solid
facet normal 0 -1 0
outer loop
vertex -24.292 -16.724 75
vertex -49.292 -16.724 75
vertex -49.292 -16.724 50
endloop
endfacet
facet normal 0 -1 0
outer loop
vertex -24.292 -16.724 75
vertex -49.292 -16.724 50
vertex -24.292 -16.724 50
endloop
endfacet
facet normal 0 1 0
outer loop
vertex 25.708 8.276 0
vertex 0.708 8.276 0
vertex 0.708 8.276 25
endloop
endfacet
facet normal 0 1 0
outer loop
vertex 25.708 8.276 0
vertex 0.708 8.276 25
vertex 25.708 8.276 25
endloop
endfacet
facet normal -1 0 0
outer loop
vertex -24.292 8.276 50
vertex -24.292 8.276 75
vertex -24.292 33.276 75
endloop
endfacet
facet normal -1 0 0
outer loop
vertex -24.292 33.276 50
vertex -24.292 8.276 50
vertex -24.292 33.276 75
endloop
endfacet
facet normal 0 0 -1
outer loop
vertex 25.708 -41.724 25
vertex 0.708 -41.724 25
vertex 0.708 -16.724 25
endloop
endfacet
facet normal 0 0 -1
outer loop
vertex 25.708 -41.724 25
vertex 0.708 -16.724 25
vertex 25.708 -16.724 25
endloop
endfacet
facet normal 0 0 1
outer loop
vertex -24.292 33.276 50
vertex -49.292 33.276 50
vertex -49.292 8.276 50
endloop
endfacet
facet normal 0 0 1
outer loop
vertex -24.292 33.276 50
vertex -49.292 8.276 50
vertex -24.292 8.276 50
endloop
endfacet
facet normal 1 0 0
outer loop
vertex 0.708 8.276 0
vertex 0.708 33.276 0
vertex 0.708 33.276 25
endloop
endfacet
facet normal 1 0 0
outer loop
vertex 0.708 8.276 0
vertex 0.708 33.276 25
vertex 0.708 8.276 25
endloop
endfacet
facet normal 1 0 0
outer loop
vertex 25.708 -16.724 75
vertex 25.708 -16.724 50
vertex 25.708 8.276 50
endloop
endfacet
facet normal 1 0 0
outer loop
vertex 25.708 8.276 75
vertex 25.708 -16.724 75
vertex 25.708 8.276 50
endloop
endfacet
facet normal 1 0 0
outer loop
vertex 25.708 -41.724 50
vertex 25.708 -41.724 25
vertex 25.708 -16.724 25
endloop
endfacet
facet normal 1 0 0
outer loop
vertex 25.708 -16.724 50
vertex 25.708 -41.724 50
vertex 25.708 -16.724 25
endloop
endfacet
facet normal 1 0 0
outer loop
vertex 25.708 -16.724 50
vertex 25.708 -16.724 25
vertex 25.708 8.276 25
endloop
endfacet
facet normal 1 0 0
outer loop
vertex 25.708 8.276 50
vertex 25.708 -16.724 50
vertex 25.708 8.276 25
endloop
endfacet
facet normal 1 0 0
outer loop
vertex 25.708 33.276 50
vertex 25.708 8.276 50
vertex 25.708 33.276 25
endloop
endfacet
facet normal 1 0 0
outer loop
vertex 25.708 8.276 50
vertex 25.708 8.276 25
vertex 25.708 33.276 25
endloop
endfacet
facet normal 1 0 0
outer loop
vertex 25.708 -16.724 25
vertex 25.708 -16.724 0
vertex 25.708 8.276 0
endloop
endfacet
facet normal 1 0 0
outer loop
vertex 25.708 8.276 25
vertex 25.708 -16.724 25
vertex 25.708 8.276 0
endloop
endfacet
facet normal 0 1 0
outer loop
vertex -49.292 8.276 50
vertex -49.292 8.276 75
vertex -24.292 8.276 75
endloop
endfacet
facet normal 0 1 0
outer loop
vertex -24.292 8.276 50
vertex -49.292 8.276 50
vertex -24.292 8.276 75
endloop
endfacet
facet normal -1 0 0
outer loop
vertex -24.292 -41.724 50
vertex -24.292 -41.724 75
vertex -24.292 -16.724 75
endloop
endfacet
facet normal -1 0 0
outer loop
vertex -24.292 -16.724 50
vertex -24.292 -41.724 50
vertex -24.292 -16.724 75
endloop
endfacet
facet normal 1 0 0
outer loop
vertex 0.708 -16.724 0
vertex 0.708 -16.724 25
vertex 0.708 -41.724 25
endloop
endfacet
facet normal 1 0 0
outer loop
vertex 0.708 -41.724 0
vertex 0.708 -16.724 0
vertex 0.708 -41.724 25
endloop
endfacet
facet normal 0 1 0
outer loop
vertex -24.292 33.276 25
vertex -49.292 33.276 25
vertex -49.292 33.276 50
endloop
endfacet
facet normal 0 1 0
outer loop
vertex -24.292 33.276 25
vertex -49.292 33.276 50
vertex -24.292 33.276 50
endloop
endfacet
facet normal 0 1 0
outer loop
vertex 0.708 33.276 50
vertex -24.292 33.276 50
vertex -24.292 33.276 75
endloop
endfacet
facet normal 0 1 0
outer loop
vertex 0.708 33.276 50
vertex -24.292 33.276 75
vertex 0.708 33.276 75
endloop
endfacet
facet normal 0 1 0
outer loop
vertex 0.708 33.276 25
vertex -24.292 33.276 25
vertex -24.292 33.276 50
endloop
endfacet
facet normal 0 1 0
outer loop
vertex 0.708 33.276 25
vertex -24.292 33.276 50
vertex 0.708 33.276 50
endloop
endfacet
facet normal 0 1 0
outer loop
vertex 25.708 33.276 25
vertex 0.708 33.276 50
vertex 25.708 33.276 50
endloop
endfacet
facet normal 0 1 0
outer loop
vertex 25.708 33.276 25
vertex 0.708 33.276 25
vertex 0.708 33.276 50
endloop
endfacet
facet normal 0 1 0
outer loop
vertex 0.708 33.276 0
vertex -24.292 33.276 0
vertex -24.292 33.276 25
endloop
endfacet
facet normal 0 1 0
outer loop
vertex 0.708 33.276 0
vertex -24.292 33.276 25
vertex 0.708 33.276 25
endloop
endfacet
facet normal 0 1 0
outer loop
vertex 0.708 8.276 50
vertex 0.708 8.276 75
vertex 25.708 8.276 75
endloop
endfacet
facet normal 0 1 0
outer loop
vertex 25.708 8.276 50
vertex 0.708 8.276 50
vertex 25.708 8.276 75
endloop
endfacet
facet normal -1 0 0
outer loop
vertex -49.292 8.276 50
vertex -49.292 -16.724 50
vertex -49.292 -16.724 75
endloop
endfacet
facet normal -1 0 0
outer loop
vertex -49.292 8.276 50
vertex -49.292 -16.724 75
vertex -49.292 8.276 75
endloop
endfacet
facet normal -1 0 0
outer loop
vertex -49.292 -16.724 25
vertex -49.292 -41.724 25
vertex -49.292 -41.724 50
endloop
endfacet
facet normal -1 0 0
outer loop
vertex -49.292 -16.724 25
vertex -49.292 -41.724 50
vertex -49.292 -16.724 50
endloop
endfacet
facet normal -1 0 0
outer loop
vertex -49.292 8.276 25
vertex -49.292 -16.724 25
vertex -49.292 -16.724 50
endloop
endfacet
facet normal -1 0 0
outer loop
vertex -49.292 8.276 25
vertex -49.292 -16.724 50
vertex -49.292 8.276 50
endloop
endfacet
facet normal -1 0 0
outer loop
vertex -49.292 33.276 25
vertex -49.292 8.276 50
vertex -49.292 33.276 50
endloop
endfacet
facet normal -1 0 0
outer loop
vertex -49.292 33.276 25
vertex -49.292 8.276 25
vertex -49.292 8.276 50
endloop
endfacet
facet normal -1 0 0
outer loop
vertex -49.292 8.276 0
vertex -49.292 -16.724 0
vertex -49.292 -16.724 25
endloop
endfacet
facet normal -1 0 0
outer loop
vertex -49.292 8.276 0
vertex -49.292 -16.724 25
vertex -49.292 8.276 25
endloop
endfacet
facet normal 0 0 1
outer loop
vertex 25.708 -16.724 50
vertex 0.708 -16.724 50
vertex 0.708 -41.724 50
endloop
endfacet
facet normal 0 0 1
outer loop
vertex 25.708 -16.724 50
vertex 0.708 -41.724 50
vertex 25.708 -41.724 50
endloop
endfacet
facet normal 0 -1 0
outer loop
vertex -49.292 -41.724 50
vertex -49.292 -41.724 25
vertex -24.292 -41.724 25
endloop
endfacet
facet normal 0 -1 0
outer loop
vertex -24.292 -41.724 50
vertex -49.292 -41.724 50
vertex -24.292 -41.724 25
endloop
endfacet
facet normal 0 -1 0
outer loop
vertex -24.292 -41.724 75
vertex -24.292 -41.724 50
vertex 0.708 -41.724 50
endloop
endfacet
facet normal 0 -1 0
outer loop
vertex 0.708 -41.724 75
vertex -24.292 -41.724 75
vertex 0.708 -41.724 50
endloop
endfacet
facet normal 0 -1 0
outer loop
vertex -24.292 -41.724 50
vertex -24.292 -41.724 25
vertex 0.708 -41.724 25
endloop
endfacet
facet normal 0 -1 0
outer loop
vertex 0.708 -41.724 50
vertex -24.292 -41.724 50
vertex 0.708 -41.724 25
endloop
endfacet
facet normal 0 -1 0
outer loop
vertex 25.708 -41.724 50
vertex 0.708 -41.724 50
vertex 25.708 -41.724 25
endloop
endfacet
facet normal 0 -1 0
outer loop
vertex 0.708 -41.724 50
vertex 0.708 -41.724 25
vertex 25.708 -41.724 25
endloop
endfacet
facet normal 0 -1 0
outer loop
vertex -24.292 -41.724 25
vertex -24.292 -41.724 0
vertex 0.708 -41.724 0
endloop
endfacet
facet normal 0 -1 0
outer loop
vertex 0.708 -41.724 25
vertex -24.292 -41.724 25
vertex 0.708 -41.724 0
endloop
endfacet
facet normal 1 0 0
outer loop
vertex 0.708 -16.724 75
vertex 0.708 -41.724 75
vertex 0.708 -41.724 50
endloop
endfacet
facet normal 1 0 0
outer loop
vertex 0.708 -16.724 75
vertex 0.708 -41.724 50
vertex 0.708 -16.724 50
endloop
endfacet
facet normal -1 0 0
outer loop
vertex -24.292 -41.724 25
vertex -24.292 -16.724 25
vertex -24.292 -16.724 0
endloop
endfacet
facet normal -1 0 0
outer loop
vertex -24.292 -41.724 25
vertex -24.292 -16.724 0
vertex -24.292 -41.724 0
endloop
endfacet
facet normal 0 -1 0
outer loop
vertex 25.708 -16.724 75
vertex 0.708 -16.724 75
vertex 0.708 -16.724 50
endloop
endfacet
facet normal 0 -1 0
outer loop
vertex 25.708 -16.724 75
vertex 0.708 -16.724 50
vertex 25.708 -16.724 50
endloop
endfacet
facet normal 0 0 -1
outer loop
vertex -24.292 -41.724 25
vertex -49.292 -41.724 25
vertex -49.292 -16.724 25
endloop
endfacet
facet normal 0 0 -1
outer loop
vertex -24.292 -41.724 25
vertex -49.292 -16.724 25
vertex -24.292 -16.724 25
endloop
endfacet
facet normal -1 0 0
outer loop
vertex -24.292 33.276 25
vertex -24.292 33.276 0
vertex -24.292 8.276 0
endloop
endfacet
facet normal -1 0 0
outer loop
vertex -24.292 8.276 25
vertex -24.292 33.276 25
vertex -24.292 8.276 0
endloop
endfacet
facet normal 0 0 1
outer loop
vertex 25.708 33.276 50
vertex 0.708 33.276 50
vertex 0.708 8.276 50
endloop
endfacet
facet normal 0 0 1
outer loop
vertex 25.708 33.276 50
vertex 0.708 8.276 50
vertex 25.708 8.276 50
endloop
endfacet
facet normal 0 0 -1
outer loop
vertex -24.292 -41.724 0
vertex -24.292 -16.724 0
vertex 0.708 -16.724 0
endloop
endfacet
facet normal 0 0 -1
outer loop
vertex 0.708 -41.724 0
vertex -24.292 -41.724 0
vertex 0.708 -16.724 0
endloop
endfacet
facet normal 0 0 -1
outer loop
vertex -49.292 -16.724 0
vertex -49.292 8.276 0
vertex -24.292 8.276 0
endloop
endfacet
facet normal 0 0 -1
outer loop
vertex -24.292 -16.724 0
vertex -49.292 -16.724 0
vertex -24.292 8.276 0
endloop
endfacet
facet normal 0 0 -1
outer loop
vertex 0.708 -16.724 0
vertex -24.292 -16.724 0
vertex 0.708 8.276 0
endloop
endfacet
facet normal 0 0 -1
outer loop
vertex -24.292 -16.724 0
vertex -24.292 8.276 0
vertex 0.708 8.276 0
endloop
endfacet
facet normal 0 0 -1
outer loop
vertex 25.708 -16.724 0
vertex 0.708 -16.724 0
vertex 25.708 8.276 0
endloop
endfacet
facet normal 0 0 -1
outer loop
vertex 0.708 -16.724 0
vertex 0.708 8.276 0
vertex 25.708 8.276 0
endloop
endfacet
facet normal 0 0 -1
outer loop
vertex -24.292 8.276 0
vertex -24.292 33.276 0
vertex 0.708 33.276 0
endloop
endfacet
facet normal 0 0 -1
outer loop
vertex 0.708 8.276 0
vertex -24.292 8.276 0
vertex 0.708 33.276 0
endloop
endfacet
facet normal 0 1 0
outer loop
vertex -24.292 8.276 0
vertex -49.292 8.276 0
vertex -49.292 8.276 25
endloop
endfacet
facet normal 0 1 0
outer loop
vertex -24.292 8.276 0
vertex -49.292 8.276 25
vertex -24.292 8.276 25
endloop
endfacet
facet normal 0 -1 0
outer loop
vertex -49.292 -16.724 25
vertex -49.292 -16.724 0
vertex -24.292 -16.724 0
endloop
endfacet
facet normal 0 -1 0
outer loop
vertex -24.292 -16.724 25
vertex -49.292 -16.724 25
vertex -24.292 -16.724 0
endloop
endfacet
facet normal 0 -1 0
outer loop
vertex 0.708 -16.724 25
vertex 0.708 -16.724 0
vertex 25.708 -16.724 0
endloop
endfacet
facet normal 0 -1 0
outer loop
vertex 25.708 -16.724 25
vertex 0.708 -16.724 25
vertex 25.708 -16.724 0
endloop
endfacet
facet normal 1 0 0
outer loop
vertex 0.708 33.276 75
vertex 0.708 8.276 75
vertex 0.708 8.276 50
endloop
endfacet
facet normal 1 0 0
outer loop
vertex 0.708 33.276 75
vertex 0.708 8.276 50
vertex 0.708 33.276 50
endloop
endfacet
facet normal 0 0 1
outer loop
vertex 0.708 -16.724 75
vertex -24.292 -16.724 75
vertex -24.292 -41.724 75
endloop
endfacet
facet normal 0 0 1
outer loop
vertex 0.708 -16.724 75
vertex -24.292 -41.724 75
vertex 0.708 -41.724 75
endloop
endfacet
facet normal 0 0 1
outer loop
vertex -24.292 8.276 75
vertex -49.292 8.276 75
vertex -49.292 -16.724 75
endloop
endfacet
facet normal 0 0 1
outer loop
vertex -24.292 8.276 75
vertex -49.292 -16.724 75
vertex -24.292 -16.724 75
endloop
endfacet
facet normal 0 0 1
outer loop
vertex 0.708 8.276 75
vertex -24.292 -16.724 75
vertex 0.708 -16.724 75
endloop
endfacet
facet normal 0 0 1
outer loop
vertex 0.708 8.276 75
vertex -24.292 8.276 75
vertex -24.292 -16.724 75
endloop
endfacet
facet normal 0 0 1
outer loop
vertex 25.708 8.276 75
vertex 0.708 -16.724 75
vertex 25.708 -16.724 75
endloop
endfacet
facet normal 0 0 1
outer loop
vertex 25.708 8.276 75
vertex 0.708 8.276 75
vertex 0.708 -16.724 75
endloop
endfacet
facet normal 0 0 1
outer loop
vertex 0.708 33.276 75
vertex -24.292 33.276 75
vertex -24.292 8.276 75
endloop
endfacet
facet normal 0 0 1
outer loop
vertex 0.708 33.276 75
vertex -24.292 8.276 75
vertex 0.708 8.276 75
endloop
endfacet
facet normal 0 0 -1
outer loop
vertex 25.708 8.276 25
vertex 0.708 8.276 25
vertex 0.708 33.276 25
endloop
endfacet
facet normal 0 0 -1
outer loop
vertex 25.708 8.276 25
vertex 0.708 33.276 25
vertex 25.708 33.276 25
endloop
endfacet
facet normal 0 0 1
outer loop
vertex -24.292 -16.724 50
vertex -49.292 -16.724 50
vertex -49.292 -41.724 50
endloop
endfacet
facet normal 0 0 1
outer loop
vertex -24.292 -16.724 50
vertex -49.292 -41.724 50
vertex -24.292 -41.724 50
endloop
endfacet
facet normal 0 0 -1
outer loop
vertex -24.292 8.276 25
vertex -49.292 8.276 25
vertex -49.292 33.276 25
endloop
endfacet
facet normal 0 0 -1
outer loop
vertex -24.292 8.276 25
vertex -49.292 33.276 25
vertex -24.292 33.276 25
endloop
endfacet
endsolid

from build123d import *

# Parameters (mm, degrees)
F0_W     = 75
F0_H     = 75
F1_DEPTH = 75
F2_W     = 25
F2_H     = 25
F3_DEPTH = 25
F4_W     = 25
F4_H     = 25
F5_DEPTH = 25


with BuildPart() as f1:
    # F0 (on Top) → F1 (new body)
    with BuildSketch(Plane.XY):
        with Locations((-11.791817, -4.223716)):
            Rectangle(F0_W, F0_H)
    extrude(amount=F1_DEPTH)

    # F2 (on face) → F3 (cut)
    with BuildSketch(Plane(origin=(0, 0, 0), x_dir=(1, 0, 0), z_dir=(0, 0, -1))):
        with Locations((-36.791817, 29.223716)):
            Rectangle(F2_W, F2_H)
        with Locations((-36.791817, -20.776284)):
            Rectangle(F2_W, F2_H)
        with Locations((13.208183, 29.223716)):
            Rectangle(F2_W, F2_H)
        with Locations((13.208183, -20.776284)):
            Rectangle(F2_W, F2_H)
    extrude(amount=-F3_DEPTH, mode=Mode.SUBTRACT)

    # F4 (on face) → F5 (cut)
    with BuildSketch(Plane.XY.offset(75)):
        with Locations((-36.791817, 20.776284)):
            Rectangle(F4_W, F4_H)
        with Locations((13.208183, 20.776284)):
            Rectangle(F4_W, F4_H)
        with Locations((-36.791817, -29.223716)):
            Rectangle(F4_W, F4_H)
        with Locations((13.208183, -29.223716)):
            Rectangle(F4_W, F4_H)
    extrude(amount=-F5_DEPTH, mode=Mode.SUBTRACT)


solid = f1.part
